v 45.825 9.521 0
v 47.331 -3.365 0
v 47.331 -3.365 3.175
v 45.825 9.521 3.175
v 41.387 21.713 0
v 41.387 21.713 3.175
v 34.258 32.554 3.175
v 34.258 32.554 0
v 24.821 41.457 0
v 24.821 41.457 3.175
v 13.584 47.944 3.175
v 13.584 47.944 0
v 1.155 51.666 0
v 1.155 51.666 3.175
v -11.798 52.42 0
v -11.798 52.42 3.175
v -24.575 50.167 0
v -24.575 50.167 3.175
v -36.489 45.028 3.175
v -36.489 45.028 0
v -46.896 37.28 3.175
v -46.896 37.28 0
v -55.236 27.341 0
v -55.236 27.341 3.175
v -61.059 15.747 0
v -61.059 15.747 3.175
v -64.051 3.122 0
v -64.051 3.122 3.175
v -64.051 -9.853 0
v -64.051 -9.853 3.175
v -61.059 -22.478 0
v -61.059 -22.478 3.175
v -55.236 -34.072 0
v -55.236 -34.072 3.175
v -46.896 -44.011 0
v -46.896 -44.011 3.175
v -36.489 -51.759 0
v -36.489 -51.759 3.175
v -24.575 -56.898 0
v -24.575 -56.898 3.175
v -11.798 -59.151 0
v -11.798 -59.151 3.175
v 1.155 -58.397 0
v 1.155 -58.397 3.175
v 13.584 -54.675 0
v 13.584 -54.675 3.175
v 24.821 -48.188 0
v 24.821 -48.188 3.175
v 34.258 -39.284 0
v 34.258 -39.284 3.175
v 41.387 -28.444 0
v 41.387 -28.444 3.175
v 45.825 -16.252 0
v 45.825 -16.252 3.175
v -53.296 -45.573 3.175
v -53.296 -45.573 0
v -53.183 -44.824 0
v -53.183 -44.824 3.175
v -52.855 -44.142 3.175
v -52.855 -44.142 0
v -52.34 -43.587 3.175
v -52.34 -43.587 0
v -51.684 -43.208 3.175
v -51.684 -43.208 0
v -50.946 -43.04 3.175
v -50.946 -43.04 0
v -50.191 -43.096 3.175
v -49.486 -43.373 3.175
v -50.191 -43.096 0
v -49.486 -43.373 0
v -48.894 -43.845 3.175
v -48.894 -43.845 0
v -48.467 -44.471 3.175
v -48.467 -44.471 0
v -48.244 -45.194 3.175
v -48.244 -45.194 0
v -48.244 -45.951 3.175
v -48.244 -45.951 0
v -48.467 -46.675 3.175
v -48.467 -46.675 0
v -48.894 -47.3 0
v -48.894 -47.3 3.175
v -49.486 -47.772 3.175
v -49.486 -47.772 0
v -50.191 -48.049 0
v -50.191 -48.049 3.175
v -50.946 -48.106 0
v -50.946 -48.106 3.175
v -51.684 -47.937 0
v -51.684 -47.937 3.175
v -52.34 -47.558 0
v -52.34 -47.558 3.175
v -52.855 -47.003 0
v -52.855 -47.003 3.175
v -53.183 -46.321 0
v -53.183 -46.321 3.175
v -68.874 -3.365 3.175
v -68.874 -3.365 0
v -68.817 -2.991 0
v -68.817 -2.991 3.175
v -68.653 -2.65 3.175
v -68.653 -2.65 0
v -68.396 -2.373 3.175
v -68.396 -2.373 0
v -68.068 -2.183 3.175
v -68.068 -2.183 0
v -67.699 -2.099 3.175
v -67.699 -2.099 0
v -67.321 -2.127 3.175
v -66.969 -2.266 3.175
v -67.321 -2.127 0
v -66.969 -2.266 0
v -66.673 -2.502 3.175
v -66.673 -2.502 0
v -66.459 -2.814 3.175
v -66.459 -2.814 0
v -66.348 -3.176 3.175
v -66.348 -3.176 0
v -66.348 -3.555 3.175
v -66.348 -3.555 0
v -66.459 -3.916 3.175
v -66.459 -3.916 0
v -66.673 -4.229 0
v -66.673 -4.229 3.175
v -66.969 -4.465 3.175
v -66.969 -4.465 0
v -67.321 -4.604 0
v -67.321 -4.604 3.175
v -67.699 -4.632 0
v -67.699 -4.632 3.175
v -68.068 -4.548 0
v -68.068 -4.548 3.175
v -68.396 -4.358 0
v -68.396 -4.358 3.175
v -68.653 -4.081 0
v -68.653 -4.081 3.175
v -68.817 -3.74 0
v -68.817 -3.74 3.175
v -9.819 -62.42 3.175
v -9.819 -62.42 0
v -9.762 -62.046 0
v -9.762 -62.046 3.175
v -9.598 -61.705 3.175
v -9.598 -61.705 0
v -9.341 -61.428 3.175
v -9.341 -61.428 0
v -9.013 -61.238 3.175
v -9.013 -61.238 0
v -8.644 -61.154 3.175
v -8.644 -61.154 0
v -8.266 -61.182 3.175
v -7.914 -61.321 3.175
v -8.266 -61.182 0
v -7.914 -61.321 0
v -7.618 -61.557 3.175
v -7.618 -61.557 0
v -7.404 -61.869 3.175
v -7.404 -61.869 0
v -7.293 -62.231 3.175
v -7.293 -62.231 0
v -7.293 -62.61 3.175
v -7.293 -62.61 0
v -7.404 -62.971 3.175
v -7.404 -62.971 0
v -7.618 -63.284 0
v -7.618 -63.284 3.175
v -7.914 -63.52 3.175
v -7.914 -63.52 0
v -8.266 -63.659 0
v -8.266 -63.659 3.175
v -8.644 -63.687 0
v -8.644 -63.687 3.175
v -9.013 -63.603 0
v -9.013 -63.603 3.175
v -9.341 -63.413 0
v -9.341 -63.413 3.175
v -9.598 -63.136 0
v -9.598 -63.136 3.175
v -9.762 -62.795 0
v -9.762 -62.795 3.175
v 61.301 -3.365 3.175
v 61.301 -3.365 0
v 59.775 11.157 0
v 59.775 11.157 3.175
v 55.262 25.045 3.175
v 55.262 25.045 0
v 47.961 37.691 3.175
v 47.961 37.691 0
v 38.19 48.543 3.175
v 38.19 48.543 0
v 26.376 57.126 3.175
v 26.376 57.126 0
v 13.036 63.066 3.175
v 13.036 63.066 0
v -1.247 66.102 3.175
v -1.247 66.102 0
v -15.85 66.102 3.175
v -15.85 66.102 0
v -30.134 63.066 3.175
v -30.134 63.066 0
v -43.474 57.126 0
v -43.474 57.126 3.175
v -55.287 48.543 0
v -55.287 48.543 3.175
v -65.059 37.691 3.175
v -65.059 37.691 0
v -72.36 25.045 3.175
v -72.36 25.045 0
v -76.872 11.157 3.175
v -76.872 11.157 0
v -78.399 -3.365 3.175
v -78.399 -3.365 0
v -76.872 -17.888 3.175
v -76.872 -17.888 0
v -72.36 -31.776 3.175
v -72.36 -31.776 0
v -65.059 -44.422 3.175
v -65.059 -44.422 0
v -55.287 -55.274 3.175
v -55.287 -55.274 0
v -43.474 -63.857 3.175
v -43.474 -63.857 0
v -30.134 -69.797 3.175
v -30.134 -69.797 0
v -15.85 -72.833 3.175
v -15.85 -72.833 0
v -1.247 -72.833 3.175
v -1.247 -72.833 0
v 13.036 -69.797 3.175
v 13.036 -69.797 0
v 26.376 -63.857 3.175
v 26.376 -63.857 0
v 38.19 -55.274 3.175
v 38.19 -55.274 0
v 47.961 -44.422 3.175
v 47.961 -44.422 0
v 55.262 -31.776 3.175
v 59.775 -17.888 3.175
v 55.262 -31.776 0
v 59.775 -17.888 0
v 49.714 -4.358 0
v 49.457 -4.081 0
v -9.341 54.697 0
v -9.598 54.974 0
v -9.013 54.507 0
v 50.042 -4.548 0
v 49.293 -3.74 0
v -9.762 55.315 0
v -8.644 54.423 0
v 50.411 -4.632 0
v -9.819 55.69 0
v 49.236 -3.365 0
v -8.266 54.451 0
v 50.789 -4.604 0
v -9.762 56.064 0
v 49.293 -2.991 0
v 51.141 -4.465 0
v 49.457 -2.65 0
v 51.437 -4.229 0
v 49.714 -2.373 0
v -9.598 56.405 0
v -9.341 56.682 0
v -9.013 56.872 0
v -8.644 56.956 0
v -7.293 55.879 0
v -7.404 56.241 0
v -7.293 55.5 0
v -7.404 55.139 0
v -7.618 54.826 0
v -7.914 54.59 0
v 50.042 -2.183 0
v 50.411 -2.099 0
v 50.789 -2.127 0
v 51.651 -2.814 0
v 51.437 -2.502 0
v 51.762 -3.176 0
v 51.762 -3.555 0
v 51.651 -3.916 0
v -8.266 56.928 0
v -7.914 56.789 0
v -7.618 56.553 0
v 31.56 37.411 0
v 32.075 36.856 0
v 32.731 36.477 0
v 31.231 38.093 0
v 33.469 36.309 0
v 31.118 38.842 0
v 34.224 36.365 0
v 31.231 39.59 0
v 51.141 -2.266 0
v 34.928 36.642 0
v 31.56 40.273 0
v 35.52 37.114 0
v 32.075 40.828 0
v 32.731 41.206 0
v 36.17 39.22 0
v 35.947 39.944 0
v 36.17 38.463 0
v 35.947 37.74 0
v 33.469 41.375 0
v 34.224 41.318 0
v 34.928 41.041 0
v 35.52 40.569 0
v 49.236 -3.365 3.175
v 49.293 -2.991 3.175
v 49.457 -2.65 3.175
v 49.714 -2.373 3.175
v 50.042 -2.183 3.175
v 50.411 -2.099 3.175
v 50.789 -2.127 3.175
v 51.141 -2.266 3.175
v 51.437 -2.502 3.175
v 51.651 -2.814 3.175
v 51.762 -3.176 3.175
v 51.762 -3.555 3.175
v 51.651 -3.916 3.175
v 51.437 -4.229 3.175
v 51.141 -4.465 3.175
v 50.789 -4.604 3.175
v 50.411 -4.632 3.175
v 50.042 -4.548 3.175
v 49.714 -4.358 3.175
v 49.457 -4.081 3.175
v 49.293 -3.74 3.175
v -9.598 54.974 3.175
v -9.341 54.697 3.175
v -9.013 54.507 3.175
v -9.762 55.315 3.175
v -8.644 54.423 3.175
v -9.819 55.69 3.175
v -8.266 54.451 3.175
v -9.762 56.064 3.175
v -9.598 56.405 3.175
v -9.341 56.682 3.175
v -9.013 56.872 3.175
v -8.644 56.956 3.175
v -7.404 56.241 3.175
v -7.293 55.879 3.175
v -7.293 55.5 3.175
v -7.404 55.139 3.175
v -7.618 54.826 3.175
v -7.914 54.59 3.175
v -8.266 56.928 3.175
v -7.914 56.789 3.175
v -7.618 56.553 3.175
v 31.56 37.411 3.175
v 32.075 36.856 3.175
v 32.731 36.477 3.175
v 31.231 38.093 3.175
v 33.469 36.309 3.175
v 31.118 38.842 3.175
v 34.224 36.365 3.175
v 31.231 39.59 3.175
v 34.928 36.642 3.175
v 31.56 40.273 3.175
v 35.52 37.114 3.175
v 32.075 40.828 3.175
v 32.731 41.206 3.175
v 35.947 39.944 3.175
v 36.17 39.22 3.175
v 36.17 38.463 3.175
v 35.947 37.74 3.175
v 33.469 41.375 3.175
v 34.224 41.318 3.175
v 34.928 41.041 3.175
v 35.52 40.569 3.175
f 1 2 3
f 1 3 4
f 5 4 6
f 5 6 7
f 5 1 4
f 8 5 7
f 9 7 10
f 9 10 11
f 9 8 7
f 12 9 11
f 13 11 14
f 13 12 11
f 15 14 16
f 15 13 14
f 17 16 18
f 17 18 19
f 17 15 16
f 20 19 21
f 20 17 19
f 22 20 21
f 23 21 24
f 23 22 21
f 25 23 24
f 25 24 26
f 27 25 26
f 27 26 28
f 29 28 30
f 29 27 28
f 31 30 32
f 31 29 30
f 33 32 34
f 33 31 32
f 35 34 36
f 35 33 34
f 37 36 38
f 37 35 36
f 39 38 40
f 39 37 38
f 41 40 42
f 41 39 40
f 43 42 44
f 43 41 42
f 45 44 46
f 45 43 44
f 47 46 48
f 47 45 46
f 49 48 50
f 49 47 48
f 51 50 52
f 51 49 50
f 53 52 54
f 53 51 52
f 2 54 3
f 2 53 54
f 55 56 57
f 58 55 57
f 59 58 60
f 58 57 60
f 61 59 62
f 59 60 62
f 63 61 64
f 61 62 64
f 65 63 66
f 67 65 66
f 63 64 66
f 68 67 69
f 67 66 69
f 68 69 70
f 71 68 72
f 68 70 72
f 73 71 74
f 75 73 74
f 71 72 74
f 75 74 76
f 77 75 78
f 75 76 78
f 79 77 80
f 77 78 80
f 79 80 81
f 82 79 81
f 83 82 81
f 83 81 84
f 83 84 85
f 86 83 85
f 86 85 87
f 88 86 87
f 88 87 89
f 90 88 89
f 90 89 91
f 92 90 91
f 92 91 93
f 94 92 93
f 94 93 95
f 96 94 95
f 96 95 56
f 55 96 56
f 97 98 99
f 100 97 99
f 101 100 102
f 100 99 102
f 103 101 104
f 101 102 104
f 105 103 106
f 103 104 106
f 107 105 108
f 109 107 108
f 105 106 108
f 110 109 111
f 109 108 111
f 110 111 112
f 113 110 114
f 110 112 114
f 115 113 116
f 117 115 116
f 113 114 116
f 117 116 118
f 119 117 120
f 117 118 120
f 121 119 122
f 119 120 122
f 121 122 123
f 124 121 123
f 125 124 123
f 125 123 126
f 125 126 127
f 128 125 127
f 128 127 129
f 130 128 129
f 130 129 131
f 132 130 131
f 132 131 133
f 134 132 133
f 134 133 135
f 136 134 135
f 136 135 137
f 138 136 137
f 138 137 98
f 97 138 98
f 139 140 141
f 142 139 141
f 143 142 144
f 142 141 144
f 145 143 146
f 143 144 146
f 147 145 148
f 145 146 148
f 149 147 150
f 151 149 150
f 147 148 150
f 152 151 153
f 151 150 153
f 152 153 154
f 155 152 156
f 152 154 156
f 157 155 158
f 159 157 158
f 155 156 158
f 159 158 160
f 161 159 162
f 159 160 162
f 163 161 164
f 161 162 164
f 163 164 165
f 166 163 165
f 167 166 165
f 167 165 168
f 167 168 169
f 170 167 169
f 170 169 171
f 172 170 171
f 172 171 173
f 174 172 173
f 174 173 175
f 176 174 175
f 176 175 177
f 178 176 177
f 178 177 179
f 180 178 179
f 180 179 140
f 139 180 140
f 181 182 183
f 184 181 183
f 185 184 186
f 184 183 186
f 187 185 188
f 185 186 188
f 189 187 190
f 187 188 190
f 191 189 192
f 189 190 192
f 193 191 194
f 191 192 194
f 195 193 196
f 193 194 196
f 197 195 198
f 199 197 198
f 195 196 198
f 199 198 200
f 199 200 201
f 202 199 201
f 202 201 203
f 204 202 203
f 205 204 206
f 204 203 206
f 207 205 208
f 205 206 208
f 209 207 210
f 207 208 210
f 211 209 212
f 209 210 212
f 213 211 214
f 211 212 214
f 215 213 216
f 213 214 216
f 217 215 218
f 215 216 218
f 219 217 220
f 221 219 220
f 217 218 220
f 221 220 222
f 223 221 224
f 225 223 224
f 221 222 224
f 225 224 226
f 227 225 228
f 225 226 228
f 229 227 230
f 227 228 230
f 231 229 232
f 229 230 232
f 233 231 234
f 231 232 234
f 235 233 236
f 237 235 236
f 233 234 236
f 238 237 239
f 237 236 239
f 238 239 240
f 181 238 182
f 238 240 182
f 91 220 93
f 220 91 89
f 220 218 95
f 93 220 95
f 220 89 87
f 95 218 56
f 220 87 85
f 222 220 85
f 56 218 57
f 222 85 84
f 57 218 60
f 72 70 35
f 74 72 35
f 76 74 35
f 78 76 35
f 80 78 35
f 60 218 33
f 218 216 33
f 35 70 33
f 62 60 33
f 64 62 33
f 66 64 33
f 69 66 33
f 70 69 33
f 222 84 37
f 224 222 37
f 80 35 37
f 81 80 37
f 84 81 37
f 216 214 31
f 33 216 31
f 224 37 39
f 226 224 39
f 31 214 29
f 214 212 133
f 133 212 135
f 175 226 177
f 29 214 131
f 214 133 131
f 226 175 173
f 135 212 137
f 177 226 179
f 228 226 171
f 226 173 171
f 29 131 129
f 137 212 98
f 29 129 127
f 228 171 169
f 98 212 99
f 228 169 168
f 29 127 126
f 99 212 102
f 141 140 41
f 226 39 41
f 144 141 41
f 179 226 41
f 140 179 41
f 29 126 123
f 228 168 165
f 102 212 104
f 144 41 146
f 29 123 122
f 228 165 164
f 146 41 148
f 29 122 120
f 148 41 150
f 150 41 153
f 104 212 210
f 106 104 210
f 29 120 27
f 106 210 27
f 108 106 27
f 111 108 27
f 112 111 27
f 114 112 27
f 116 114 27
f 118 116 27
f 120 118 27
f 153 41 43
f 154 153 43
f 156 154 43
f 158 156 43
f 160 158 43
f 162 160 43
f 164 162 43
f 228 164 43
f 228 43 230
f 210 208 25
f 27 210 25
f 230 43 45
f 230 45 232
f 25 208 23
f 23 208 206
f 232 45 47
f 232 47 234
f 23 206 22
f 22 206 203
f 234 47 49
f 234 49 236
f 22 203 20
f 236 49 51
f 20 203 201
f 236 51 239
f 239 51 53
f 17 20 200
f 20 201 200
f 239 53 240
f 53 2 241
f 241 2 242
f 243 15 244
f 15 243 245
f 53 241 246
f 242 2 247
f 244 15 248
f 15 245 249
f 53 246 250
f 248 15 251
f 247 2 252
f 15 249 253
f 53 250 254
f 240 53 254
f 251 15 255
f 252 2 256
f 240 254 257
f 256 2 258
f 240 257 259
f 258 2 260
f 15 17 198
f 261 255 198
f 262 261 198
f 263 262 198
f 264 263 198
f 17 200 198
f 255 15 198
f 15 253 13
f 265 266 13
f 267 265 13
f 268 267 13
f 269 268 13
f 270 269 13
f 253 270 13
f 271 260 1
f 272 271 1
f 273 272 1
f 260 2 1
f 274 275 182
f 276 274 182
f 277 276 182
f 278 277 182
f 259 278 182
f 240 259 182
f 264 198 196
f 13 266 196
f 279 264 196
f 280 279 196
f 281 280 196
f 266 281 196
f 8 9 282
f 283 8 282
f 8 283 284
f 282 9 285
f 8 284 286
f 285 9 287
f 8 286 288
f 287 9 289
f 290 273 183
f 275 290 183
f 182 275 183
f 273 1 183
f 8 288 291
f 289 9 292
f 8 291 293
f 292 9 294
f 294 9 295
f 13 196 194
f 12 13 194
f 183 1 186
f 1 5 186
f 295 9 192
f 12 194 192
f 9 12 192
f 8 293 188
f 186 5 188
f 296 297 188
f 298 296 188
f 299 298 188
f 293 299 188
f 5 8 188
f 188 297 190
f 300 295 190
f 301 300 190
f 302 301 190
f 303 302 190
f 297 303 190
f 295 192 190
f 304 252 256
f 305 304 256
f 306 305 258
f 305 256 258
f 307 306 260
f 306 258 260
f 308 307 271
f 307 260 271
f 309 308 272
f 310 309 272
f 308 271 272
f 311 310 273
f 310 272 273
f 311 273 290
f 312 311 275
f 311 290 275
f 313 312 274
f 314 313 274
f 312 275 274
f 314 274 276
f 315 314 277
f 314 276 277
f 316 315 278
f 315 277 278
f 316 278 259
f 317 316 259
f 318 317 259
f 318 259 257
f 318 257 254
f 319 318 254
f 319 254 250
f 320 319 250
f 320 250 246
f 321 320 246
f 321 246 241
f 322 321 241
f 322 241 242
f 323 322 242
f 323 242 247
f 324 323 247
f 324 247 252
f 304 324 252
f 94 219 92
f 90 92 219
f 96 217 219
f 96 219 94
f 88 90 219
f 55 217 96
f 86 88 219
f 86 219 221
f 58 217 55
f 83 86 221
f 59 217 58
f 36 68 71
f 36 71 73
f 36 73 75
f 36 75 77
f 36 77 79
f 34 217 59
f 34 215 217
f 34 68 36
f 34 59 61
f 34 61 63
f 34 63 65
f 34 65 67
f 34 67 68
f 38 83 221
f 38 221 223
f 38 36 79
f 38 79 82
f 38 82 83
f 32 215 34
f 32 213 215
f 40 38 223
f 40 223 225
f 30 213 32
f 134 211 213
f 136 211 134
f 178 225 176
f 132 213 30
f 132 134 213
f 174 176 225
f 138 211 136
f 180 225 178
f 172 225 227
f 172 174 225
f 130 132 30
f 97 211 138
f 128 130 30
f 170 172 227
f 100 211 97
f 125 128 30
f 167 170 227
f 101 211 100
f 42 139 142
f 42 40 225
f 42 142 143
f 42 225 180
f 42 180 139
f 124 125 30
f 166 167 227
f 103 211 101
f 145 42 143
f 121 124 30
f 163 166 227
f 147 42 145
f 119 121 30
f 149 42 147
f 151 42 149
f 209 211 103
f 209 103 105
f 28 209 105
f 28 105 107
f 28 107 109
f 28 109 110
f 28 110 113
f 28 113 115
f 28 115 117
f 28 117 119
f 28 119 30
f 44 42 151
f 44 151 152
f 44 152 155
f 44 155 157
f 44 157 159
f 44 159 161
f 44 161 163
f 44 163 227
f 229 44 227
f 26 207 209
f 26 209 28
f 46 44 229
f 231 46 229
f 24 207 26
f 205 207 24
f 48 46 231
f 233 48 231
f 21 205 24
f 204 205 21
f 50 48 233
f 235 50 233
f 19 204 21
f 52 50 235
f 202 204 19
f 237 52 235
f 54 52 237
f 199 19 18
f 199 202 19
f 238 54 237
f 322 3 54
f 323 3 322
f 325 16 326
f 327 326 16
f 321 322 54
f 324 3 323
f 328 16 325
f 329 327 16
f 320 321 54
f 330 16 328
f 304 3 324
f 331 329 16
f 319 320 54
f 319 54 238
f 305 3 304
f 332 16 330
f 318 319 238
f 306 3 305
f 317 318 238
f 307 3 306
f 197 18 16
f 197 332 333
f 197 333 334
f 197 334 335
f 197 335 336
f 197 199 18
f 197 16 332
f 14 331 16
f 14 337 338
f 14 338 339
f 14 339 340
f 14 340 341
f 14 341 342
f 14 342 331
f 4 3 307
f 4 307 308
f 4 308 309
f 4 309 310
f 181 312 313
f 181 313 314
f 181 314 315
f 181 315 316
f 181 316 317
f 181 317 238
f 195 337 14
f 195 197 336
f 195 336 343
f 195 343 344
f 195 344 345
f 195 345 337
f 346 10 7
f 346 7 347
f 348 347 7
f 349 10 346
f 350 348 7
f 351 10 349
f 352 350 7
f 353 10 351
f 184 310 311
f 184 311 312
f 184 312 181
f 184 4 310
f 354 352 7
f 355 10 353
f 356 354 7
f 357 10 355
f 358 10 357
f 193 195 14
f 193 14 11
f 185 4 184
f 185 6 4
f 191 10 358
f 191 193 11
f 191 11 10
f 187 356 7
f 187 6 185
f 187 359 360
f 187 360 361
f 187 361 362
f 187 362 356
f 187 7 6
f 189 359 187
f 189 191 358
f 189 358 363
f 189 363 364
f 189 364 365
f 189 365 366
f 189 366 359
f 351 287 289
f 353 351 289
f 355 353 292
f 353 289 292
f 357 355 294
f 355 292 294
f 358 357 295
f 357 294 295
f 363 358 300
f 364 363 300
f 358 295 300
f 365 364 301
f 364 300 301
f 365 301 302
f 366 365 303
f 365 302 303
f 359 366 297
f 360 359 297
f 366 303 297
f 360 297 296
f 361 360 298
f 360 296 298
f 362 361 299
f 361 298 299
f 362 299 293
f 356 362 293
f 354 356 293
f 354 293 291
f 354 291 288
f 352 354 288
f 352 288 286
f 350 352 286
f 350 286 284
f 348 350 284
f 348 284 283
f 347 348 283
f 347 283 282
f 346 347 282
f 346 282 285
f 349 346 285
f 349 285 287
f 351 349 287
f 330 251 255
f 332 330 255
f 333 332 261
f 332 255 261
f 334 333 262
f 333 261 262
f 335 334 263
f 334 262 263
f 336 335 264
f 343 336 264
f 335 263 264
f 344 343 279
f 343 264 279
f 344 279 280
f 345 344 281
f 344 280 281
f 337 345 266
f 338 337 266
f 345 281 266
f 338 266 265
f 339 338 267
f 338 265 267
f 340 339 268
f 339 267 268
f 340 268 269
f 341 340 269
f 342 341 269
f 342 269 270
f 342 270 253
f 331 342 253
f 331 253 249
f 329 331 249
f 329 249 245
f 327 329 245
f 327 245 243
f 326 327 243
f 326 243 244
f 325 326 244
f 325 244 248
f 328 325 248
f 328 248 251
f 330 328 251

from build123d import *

# Parameters (mm, degrees)
SKETCH1_R           = 69.85
SKETCH1_R_2         = 55.88
BOSS_EXTRUDE1_DEPTH = 3.175
SKETCH4_R           = 1.27
SKETCH4_R_2         = 2.54
CUT_EXTRUDE2_DEPTH  = 108.317012813


with BuildPart() as part:
    # Sketch1 → Boss-Extrude1 (new body)
    with BuildSketch(Plane.XY):
        with Locations((-8.548720341, -3.365444156)):
            Circle(SKETCH1_R)
        with Locations((-8.548720341, -3.365444156)):
            Circle(SKETCH1_R_2, mode=Mode.SUBTRACT)
    extrude(amount=BOSS_EXTRUDE1_DEPTH)

    # Sketch4 → Cut-Extrude2 (cut, through all)
    with BuildSketch(Plane(origin=(0, 0, 0), x_dir=(-1, 0, 0), z_dir=(0, 0, -1))):
        with Locations((8.548720341, 55.689555844)):
            Circle(SKETCH4_R)
        with Locations((8.548720341, -62.420444156)):
            Circle(SKETCH4_R)
        with Locations((-50.506279659, -3.365444156)):
            Circle(SKETCH4_R)
        with Locations((67.603720341, -3.365444156)):
            Circle(SKETCH4_R)
        with Locations((-33.658483428, 38.841759613)):
            Circle(SKETCH4_R_2)
        with Locations((50.75592411, -45.572647925)):
            Circle(SKETCH4_R_2)
    extrude(amount=-CUT_EXTRUDE2_DEPTH, mode=Mode.SUBTRACT)


solid = part.part
